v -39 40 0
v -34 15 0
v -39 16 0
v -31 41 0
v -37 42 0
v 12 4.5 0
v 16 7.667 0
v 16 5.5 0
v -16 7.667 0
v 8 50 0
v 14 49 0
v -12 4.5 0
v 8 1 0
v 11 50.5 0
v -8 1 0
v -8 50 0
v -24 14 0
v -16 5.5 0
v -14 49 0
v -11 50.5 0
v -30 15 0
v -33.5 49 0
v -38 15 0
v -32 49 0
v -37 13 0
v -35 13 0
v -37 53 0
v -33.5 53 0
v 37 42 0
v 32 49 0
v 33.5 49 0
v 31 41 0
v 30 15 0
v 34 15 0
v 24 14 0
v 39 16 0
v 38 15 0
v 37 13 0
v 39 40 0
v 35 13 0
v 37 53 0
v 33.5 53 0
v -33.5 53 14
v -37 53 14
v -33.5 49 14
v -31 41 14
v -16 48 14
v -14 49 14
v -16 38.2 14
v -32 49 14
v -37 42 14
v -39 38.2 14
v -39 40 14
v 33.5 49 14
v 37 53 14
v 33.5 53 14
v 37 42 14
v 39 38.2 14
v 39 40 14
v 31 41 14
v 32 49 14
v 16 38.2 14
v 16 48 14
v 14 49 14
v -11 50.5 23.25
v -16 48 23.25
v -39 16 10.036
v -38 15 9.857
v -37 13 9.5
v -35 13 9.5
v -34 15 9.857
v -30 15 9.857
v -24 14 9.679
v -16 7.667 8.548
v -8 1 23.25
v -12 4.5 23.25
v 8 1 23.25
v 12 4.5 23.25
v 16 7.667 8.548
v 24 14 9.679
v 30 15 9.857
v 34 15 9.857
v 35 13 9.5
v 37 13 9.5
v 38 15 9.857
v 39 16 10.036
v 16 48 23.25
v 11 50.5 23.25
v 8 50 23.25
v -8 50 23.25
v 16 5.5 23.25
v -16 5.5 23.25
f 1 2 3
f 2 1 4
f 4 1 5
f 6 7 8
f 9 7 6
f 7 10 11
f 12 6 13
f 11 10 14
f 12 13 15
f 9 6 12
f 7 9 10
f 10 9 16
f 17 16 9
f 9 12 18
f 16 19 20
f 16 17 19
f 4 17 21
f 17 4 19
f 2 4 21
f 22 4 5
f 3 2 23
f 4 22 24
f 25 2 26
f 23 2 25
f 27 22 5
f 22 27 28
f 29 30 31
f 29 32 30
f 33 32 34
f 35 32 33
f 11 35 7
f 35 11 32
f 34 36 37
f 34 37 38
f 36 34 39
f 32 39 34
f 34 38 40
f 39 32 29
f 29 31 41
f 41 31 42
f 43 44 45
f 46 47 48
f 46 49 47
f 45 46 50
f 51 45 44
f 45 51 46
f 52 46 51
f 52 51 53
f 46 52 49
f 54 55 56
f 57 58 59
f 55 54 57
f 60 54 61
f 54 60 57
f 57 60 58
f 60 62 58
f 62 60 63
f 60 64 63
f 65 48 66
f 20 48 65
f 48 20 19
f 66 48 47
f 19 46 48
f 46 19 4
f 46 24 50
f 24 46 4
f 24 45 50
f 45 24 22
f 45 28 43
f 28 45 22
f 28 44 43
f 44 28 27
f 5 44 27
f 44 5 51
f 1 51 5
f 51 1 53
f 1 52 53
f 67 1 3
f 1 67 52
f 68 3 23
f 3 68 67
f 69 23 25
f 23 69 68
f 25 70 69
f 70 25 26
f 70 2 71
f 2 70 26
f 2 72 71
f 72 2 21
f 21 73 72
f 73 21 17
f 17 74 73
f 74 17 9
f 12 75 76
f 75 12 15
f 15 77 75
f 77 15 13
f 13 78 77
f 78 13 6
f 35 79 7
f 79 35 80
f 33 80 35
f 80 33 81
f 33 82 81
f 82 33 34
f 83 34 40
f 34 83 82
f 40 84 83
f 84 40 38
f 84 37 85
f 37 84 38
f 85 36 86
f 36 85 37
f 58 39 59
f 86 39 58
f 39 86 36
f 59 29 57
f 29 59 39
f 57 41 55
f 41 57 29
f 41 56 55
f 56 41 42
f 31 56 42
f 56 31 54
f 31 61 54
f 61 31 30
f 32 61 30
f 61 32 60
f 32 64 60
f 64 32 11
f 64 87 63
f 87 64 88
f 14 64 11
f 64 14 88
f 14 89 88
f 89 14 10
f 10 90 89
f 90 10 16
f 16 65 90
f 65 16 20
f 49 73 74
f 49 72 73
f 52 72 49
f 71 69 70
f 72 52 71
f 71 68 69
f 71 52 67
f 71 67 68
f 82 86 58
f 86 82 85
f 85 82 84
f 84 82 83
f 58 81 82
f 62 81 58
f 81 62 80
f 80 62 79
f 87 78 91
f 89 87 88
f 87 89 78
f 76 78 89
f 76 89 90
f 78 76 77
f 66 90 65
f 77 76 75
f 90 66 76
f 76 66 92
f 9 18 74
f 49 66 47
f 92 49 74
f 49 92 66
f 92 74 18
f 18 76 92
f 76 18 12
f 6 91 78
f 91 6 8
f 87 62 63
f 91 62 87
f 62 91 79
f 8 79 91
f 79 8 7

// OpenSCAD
/* scurrg-bin.scad
 *
 * Copyright (C) Robert B. Ross, 2017
 *
 * This software is released under the Creative Commons
 * Attribution-ShareAlike 4.0 International Public License.
 */

include <./bintools.scad>

$fn=160;
binHeight   = 46.5/2;
angle=0;

/* locations is a pair of triples, translate : rotate pairs
 */
locations = [[[26.5,-31,0], [0,0,53]]];

if (0) harborFreightLargeHalfHt(locations,inset=0.5,filled=1,cornerRad=3.75,
                          bottomThick=0.9) scurrgBlank();
if (1) scurrgBlank();

if (0) {
translate([-50,0,0]) harborFreightLargeHalfHt(locations,inset=0.5,filled=1,cornerRad=3.75,
                          bottomThick=0.9) scurrgBlank();
translate([50,0,0]) harborFreightLargeHalfHt(locations,inset=0.5,filled=0,cornerRad=3.75,
                          bottomThick=0.9) scurrgBlank();

translate([0,-120,0]) scurrgBlank();
}

// scurrgOutline();

/* scurrgOutline() -- test piece for outline
 */
module scurrgOutline() {
   translate([0,0,18-0.1]) rotate([180,0,0]) {
      blankCutout(height=18 - 0.1, outlineScale=1.2) scurrgBlank();
   }
}

module scurrgBlank(centerCutout=1, useProfile=1) {
   blankHeight = 14.0;
   
   /* Note: position blank upside-down on XY plane */
   union() {
      translate([0,0,0]) intersection() {
         linear_extrude(height=blankHeight) scurrgShell();
         if (useProfile) scurrgProfile(h=blankHeight);
      }
      if (centerCutout) linear_extrude(height=binHeight) scurrgCutoutPoly();
   } /* rotate, translate, union */
}

/* scurrgShell() -- exterior outline */
module scurrgShell() {
   for (j=[0:1]) mirror([j,0,0])
      polygon(points=[
                     [-0.1,1], [8,1], [12,4.5], [24,14], [30,15], [34,15], 
                     [35,13], [37,13], [38,15], [39.0,16], [39.0,40], 
                     [37,42], [37,53], [33.5,53], [33.5,49], [32,49],
                     [31,41], [14,49], [11,50.5], [8,50], [-0.1,50]
                     ]);
}

/* scurrgProfile() - defines the side profile of the blank (not cutout)
 */
module scurrgProfile(h=100,w=200)
{
   translate([-1*w/2,0,0]) rotate([90,0,90]) linear_extrude(height=w) {
      polygon(points=[
                     [-1,0], [55,0], [55,17], [-1,7]
                     ]);
   }

}

/* scurrgCutoutPoly() -- defines a polygon to be cut all the way to the
 *                     bottom of the bin.
 *
 */
module scurrgCutoutPoly() {
   for (j=[0:1]) mirror([j,0,0])
      polygon(points=[
                     [-0.1,1], [8,1], [12,4.5], [16,5.5], [16,48], [14,49],
                     [11,50.5], [8,50], [-0.1,50]
                     ]);
}

/*
 * Local variables:
 *  mode: C
 *  c-indent-level: 3
 *  c-basic-offset: 3
 * End:
 *
 * vim: ts=8 sts=3 sw=3 expandtab
 */
